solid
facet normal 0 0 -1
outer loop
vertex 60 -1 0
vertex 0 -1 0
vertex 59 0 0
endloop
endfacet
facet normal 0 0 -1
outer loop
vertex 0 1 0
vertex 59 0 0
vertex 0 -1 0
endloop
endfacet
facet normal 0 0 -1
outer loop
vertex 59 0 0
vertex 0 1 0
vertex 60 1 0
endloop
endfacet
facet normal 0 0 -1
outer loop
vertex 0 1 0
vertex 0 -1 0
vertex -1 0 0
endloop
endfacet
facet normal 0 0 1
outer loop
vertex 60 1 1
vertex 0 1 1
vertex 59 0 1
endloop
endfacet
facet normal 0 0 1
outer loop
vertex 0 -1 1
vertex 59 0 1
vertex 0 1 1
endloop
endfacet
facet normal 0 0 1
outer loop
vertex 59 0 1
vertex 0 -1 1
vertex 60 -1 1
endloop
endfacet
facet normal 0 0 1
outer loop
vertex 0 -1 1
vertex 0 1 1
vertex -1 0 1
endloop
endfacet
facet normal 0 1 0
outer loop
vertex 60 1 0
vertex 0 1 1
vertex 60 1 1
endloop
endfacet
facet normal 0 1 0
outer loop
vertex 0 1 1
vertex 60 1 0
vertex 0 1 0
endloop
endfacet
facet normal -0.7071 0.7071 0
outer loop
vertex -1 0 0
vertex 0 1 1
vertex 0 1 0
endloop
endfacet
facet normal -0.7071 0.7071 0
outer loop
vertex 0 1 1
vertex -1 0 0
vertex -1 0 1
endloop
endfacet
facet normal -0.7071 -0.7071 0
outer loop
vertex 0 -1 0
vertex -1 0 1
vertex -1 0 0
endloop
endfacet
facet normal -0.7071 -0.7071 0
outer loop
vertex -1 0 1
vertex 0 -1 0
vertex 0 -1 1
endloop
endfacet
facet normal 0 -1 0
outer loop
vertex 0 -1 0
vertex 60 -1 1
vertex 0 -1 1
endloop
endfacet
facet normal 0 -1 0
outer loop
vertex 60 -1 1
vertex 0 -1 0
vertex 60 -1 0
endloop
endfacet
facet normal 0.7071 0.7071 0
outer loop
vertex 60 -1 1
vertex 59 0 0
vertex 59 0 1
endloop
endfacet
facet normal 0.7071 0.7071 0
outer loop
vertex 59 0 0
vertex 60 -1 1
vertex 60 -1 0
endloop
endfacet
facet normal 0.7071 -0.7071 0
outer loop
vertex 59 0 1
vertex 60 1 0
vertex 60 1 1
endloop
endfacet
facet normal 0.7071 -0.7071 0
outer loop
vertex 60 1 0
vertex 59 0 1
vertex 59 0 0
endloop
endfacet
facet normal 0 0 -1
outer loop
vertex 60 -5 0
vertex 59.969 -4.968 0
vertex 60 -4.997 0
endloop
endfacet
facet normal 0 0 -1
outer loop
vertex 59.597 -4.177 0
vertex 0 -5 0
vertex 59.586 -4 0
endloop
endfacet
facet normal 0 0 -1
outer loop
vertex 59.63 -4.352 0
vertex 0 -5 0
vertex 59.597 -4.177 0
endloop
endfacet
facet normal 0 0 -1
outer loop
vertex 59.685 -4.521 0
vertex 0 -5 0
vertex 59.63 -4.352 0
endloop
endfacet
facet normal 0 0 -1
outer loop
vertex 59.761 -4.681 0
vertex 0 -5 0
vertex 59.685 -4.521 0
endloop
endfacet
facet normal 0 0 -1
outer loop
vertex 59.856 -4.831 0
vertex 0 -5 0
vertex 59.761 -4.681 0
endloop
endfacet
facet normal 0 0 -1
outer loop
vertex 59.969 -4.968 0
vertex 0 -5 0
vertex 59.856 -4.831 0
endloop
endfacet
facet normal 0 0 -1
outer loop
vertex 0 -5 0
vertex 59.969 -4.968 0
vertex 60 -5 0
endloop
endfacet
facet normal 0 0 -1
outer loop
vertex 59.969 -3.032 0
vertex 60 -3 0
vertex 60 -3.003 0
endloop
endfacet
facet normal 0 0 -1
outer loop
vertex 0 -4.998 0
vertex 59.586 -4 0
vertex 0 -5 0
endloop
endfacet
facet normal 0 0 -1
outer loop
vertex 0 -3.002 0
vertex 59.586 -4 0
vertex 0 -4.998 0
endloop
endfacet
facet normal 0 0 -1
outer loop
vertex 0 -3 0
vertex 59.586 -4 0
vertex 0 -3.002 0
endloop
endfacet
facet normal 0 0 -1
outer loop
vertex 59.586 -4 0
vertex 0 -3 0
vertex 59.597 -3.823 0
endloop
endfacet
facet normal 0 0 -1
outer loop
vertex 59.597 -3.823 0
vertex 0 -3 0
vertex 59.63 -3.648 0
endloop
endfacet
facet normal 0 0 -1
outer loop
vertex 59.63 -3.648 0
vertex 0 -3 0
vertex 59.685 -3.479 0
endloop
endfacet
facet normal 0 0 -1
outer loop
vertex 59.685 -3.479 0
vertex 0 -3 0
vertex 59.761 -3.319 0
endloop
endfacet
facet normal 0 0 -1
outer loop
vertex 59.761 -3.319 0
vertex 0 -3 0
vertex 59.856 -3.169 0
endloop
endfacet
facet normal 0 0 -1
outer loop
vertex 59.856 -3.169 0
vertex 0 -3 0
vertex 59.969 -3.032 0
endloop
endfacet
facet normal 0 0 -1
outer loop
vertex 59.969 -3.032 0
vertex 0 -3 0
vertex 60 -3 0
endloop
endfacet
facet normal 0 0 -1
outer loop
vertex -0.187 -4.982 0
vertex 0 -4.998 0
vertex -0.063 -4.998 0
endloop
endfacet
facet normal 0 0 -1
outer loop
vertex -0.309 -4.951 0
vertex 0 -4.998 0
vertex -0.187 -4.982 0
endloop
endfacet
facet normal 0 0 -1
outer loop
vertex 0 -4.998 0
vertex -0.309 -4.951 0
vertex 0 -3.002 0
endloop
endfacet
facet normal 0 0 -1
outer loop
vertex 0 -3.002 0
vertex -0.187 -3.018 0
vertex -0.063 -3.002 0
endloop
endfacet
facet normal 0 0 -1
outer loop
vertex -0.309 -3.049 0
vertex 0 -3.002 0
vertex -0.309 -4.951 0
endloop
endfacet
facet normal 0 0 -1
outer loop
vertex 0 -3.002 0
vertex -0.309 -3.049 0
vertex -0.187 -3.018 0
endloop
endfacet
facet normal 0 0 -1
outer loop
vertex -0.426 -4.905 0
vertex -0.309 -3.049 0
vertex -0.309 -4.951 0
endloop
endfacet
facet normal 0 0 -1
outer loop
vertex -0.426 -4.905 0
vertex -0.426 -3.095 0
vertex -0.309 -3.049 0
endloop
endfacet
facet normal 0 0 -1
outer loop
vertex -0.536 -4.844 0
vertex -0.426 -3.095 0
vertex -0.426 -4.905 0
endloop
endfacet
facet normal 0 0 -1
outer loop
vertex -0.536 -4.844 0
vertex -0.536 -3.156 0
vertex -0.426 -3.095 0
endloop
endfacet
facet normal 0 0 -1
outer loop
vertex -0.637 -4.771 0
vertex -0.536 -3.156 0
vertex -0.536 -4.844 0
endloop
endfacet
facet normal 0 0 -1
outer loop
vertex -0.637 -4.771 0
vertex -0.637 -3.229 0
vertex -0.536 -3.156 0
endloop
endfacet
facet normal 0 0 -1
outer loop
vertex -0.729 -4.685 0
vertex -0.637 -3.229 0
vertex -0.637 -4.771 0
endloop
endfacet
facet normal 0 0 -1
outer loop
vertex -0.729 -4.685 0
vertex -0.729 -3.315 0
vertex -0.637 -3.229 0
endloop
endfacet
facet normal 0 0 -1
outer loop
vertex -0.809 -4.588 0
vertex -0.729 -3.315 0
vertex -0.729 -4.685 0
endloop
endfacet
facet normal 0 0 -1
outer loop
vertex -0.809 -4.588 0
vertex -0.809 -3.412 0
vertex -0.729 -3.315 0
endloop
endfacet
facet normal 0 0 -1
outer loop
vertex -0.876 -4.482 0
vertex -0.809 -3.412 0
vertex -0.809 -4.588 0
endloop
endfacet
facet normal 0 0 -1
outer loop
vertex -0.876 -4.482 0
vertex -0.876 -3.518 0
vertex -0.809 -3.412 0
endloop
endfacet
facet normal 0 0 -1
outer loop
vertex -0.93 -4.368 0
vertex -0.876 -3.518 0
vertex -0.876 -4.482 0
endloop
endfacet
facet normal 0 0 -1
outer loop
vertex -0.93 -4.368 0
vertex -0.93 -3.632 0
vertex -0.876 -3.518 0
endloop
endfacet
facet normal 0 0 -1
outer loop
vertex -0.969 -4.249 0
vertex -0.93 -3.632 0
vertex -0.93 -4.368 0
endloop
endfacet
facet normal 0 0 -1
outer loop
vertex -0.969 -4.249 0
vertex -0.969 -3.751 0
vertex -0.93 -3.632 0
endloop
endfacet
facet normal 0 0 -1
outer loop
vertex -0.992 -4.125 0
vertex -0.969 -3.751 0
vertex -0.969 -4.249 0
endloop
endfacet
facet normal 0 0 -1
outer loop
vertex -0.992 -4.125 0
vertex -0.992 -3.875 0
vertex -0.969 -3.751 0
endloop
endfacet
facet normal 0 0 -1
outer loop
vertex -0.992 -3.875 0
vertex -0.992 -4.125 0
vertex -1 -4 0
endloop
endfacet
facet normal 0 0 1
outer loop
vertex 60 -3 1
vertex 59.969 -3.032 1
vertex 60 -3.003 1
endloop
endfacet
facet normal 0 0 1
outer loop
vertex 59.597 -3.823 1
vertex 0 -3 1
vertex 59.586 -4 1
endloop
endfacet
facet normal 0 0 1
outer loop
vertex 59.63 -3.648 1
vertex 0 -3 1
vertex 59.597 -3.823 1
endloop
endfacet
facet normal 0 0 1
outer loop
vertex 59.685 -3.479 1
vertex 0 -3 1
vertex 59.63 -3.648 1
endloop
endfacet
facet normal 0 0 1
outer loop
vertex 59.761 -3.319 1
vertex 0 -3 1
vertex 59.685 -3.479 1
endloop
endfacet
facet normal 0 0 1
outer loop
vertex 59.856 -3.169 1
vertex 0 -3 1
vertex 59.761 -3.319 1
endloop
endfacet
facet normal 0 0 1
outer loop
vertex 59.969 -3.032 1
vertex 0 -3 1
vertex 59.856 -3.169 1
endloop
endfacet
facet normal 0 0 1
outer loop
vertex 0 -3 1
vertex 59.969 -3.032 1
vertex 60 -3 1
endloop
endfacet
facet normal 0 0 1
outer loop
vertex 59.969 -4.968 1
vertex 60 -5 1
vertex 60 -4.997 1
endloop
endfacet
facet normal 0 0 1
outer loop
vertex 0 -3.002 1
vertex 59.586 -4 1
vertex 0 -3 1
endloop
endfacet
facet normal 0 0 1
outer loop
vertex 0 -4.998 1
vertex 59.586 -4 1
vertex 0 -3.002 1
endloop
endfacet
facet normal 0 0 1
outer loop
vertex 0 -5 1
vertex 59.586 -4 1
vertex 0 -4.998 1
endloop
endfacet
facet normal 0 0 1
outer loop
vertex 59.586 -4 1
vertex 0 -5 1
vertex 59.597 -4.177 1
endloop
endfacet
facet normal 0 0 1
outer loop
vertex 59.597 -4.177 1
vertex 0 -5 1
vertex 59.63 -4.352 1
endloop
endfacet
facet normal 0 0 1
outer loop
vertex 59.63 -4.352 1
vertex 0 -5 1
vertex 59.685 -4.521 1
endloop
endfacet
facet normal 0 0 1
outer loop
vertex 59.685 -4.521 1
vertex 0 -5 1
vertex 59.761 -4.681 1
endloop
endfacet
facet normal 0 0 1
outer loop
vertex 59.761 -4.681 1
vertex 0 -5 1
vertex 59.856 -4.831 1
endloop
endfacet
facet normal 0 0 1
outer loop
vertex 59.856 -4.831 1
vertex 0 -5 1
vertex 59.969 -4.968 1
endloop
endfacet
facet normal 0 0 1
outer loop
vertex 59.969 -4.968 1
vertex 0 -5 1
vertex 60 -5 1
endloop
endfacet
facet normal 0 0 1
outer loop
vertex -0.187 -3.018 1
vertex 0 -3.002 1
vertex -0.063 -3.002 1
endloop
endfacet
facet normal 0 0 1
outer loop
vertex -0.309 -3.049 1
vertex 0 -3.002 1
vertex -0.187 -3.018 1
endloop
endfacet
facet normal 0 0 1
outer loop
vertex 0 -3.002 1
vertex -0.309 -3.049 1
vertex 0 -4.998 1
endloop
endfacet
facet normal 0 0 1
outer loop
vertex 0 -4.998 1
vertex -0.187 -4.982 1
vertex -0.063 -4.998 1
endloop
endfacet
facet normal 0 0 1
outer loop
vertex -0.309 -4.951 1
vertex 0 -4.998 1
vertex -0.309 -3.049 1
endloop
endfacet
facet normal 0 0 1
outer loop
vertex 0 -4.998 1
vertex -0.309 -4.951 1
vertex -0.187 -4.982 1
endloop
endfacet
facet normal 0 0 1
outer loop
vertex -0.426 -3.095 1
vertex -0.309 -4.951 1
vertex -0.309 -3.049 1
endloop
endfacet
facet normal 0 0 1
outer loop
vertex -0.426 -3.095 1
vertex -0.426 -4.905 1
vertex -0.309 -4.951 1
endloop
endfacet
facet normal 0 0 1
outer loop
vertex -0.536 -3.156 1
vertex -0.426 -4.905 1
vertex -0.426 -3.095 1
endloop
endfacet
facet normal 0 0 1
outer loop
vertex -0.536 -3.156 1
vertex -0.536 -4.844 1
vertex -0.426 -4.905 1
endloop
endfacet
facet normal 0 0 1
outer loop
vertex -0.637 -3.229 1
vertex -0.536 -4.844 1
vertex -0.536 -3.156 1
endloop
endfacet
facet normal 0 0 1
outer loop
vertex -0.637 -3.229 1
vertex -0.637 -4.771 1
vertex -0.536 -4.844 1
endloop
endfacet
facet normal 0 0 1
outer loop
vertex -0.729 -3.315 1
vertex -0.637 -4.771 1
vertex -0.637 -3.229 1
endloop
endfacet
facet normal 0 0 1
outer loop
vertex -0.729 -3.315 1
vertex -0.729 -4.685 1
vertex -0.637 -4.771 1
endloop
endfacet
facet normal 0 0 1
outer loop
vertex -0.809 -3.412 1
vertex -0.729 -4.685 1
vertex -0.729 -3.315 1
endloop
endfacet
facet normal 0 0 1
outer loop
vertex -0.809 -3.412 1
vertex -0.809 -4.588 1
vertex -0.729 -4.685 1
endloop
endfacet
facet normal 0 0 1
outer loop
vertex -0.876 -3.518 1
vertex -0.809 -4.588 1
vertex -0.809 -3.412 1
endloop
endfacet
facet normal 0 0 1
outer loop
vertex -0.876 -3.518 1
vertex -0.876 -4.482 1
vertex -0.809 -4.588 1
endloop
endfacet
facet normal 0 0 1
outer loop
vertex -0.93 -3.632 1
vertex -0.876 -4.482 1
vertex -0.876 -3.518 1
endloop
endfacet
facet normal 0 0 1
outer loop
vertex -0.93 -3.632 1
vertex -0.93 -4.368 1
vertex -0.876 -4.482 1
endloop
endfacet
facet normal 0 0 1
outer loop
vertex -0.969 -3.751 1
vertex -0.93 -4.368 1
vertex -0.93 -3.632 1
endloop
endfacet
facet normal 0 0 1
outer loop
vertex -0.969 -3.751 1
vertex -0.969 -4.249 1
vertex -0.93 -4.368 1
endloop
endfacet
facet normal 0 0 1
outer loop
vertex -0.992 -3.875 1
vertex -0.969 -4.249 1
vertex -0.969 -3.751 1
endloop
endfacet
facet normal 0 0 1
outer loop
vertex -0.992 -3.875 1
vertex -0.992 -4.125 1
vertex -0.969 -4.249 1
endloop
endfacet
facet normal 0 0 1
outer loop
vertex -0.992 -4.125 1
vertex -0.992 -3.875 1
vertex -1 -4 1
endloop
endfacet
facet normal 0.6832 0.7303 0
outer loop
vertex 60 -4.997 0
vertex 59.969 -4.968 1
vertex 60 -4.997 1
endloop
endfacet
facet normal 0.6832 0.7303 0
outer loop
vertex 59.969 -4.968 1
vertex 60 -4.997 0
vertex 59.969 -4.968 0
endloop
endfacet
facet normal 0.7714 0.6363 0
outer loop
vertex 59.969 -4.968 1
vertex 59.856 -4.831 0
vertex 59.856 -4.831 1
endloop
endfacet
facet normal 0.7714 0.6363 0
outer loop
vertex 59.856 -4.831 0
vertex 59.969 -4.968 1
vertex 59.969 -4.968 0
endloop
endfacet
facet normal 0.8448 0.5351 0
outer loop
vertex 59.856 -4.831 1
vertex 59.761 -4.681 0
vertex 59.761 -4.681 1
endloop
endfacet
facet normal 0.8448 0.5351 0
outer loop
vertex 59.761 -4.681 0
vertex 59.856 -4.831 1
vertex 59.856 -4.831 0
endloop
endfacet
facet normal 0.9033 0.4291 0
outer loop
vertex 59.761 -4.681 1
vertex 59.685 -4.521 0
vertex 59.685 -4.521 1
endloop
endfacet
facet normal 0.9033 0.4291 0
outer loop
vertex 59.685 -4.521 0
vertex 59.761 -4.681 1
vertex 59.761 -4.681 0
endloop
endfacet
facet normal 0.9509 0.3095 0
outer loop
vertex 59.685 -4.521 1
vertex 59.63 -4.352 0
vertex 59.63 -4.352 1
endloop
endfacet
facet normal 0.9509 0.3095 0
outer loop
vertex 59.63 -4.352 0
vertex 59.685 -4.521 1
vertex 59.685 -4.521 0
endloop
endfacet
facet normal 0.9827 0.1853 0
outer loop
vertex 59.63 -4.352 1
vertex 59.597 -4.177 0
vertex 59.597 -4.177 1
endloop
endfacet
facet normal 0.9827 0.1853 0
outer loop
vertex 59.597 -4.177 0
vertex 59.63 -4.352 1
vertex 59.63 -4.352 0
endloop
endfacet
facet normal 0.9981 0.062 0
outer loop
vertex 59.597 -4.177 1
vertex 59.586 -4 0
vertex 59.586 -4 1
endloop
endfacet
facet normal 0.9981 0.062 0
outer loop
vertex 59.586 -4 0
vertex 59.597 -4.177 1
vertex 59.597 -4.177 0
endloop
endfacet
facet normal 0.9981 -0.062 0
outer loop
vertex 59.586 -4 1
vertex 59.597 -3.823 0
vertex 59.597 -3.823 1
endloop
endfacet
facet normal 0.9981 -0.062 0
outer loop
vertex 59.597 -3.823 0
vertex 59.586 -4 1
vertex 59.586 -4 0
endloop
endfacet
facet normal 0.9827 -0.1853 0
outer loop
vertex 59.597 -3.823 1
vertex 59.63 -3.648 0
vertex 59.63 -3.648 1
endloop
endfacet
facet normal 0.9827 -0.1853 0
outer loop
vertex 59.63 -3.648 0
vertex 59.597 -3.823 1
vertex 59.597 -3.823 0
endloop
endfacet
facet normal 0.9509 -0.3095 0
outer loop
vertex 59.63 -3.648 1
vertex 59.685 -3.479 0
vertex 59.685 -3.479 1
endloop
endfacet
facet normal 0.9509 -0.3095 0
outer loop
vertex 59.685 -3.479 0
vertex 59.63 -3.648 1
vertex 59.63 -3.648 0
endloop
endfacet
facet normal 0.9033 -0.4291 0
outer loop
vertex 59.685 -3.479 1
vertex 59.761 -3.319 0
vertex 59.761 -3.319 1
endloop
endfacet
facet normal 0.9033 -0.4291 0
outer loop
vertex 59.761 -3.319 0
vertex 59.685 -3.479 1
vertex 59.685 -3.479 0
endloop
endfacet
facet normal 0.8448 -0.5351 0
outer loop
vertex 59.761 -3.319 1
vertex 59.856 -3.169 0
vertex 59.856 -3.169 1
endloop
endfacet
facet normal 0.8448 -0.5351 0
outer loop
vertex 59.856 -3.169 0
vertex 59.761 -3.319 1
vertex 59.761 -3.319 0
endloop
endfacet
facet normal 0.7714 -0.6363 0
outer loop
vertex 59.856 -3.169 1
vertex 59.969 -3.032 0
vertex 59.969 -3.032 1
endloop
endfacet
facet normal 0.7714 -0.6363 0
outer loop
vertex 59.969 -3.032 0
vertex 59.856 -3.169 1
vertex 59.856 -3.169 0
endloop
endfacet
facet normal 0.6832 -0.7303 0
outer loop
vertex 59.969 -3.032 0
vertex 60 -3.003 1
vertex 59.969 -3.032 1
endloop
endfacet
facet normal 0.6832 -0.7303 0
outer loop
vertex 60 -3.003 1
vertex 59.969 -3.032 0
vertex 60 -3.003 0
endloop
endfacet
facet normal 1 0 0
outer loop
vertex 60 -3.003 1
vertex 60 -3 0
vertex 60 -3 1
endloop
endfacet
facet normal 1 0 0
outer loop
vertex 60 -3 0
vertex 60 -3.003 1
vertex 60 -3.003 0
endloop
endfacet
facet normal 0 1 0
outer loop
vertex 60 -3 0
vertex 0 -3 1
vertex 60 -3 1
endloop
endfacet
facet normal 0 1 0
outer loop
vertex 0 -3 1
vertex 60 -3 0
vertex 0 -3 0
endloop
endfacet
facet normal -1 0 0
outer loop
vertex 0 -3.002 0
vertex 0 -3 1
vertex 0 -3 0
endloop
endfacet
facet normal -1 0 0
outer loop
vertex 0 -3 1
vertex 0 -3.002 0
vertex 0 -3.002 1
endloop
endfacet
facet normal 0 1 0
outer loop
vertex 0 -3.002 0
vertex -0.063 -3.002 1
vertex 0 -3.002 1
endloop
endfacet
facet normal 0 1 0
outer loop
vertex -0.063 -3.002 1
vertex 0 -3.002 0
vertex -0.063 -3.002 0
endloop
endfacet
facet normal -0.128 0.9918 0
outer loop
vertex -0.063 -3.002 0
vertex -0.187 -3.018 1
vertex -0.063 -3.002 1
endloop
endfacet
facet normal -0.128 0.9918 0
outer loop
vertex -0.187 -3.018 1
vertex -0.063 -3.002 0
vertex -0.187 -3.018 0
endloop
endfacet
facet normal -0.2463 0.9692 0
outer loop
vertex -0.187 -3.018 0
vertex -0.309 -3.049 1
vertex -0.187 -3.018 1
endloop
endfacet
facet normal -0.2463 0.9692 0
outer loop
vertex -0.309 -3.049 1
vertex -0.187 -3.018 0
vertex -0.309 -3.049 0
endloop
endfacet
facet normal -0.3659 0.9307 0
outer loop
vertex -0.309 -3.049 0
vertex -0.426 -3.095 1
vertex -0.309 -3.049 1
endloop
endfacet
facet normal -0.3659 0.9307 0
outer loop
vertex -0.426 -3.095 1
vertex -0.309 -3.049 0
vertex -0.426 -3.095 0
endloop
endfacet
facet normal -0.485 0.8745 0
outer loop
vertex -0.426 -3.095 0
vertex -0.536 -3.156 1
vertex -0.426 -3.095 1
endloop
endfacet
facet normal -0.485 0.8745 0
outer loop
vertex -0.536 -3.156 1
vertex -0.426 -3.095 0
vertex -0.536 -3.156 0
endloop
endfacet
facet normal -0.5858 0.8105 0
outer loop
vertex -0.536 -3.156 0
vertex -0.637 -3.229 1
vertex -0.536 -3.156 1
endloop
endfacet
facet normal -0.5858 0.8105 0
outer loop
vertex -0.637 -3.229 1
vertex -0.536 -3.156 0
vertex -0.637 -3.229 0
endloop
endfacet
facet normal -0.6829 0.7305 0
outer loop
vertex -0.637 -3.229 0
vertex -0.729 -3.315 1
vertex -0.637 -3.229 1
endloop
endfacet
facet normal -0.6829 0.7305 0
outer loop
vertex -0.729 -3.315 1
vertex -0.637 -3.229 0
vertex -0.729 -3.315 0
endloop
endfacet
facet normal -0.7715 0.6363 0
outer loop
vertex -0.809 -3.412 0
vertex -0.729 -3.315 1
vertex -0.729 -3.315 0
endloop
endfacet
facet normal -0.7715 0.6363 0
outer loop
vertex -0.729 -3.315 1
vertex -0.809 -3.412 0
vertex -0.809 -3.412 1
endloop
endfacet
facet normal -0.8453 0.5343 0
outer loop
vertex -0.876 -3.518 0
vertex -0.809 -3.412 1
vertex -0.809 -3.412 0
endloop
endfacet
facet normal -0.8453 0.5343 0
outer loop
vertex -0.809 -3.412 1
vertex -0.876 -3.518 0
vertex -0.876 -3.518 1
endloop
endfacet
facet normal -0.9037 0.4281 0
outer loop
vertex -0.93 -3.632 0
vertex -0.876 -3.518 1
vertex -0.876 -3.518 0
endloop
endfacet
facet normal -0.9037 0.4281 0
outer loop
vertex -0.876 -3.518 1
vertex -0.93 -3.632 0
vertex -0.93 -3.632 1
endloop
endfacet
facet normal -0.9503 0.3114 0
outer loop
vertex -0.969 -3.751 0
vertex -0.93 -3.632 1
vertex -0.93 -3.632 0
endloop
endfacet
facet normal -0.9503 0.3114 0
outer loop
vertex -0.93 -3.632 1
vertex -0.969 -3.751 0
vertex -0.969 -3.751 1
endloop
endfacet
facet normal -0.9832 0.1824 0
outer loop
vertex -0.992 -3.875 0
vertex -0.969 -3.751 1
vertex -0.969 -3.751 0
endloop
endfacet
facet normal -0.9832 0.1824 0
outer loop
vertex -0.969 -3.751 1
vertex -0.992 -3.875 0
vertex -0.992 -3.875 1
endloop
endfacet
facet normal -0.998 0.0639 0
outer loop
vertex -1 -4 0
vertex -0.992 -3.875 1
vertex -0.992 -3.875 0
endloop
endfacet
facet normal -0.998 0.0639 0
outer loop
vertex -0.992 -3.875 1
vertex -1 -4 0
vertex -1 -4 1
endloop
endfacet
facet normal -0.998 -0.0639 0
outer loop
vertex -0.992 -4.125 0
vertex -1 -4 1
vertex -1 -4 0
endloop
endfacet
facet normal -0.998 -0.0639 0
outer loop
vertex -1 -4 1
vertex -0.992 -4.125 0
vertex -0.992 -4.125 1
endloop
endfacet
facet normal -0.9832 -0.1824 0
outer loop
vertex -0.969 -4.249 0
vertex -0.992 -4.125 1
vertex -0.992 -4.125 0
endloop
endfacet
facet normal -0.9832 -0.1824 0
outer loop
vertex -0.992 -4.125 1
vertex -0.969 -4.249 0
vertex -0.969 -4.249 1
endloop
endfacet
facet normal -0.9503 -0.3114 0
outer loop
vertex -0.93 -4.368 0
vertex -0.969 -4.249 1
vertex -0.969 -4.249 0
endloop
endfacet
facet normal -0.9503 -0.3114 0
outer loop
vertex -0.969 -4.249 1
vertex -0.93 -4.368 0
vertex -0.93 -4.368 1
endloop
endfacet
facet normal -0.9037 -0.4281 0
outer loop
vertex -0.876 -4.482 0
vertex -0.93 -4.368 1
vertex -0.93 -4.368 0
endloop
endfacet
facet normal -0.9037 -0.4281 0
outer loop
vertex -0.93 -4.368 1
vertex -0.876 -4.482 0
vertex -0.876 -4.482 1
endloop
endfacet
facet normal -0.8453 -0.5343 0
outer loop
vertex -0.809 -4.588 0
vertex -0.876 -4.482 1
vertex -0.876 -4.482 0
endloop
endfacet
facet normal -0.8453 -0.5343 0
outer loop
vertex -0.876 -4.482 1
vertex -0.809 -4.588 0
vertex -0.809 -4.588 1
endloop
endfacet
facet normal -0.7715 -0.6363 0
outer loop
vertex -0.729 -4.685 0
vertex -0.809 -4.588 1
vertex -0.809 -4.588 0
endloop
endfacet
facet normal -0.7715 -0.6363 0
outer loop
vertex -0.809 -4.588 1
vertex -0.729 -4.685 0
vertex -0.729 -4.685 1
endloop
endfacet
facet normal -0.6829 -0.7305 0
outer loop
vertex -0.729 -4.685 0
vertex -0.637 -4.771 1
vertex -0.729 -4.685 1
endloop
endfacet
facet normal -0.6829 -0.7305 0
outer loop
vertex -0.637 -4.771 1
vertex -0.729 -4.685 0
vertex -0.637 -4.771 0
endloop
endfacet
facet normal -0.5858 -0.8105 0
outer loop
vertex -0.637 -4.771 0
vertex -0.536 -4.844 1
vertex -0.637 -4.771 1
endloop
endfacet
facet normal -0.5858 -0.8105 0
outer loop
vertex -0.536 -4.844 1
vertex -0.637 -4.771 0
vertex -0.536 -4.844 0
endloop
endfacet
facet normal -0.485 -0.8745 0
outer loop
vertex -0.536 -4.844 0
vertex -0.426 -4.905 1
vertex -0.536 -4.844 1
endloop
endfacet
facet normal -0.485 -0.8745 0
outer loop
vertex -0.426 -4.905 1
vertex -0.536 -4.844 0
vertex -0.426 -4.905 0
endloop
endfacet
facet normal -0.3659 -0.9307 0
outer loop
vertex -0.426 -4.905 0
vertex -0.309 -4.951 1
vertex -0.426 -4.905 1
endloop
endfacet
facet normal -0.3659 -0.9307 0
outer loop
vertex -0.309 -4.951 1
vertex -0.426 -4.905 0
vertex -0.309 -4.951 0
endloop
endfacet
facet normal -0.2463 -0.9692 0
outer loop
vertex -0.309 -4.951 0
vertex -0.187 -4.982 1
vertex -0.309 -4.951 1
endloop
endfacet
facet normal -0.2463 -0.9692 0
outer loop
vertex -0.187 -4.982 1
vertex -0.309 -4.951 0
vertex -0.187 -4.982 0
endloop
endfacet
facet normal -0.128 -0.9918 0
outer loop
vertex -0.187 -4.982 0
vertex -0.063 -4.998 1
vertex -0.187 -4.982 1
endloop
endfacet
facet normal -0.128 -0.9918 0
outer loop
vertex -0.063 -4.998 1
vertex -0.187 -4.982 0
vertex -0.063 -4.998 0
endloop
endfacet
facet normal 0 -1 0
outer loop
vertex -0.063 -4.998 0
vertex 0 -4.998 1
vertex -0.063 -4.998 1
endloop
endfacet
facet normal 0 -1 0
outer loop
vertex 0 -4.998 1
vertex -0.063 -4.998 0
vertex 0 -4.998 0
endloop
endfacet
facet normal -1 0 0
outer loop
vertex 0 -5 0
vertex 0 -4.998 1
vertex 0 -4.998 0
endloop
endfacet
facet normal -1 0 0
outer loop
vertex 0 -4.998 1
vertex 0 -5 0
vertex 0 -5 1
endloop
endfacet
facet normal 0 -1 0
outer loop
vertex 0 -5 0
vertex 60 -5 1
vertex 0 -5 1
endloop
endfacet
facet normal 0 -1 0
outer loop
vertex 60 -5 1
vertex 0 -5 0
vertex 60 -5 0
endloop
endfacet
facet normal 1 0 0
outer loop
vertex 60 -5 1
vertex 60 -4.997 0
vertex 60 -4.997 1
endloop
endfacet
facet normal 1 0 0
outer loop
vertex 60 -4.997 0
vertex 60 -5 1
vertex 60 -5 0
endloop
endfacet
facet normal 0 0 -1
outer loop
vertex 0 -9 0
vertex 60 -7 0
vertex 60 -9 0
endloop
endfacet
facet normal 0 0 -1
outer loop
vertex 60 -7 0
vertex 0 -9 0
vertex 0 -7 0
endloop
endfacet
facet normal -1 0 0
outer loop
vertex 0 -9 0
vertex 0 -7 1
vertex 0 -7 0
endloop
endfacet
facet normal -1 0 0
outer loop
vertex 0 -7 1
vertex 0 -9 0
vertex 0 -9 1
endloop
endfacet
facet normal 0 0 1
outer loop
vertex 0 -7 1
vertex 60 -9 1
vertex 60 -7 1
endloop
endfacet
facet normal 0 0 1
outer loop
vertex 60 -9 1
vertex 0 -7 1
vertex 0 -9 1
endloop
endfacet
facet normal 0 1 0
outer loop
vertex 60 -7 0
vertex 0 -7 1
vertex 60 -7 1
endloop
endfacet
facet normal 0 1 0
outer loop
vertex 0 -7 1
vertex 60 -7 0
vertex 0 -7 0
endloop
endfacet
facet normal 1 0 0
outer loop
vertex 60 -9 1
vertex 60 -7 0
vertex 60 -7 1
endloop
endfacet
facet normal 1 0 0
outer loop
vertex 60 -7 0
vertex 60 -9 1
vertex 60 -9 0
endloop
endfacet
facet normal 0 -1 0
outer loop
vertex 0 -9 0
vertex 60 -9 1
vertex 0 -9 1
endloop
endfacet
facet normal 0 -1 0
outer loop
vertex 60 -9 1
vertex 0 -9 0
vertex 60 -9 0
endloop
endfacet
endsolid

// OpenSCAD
spatula_length = 60;
spatula_thickness = 1;

$fn = 50;

spatula_width = 2;

linear_extrude(spatula_thickness)
difference () {
    union () {
        translate([0, -spatula_width/2])
        square([spatula_length, spatula_width]);
        polygon([[0, spatula_width/2],
                 [-spatula_width/2, 0],
                 [0, -spatula_width/2]]);
    }

    polygon([[spatula_length, spatula_width/2],
             [spatula_length - spatula_width/2, 0],
             [spatula_length, -spatula_width/2]]);
}

translate([0, - 2 * spatula_width])
linear_extrude(spatula_thickness)
difference () {
    union () {
        translate([0, -spatula_width/2])
        square([spatula_length, spatula_width]);
        circle(d = spatula_width);
    }
    
    translate([spatula_length + spatula_width/2, 0])
    circle(r = spatula_width/sqrt(2));
}

translate([0, - 4 * spatula_width])
linear_extrude(spatula_thickness)
translate([0, -spatula_width/2])
square([spatula_length, spatula_width]);
